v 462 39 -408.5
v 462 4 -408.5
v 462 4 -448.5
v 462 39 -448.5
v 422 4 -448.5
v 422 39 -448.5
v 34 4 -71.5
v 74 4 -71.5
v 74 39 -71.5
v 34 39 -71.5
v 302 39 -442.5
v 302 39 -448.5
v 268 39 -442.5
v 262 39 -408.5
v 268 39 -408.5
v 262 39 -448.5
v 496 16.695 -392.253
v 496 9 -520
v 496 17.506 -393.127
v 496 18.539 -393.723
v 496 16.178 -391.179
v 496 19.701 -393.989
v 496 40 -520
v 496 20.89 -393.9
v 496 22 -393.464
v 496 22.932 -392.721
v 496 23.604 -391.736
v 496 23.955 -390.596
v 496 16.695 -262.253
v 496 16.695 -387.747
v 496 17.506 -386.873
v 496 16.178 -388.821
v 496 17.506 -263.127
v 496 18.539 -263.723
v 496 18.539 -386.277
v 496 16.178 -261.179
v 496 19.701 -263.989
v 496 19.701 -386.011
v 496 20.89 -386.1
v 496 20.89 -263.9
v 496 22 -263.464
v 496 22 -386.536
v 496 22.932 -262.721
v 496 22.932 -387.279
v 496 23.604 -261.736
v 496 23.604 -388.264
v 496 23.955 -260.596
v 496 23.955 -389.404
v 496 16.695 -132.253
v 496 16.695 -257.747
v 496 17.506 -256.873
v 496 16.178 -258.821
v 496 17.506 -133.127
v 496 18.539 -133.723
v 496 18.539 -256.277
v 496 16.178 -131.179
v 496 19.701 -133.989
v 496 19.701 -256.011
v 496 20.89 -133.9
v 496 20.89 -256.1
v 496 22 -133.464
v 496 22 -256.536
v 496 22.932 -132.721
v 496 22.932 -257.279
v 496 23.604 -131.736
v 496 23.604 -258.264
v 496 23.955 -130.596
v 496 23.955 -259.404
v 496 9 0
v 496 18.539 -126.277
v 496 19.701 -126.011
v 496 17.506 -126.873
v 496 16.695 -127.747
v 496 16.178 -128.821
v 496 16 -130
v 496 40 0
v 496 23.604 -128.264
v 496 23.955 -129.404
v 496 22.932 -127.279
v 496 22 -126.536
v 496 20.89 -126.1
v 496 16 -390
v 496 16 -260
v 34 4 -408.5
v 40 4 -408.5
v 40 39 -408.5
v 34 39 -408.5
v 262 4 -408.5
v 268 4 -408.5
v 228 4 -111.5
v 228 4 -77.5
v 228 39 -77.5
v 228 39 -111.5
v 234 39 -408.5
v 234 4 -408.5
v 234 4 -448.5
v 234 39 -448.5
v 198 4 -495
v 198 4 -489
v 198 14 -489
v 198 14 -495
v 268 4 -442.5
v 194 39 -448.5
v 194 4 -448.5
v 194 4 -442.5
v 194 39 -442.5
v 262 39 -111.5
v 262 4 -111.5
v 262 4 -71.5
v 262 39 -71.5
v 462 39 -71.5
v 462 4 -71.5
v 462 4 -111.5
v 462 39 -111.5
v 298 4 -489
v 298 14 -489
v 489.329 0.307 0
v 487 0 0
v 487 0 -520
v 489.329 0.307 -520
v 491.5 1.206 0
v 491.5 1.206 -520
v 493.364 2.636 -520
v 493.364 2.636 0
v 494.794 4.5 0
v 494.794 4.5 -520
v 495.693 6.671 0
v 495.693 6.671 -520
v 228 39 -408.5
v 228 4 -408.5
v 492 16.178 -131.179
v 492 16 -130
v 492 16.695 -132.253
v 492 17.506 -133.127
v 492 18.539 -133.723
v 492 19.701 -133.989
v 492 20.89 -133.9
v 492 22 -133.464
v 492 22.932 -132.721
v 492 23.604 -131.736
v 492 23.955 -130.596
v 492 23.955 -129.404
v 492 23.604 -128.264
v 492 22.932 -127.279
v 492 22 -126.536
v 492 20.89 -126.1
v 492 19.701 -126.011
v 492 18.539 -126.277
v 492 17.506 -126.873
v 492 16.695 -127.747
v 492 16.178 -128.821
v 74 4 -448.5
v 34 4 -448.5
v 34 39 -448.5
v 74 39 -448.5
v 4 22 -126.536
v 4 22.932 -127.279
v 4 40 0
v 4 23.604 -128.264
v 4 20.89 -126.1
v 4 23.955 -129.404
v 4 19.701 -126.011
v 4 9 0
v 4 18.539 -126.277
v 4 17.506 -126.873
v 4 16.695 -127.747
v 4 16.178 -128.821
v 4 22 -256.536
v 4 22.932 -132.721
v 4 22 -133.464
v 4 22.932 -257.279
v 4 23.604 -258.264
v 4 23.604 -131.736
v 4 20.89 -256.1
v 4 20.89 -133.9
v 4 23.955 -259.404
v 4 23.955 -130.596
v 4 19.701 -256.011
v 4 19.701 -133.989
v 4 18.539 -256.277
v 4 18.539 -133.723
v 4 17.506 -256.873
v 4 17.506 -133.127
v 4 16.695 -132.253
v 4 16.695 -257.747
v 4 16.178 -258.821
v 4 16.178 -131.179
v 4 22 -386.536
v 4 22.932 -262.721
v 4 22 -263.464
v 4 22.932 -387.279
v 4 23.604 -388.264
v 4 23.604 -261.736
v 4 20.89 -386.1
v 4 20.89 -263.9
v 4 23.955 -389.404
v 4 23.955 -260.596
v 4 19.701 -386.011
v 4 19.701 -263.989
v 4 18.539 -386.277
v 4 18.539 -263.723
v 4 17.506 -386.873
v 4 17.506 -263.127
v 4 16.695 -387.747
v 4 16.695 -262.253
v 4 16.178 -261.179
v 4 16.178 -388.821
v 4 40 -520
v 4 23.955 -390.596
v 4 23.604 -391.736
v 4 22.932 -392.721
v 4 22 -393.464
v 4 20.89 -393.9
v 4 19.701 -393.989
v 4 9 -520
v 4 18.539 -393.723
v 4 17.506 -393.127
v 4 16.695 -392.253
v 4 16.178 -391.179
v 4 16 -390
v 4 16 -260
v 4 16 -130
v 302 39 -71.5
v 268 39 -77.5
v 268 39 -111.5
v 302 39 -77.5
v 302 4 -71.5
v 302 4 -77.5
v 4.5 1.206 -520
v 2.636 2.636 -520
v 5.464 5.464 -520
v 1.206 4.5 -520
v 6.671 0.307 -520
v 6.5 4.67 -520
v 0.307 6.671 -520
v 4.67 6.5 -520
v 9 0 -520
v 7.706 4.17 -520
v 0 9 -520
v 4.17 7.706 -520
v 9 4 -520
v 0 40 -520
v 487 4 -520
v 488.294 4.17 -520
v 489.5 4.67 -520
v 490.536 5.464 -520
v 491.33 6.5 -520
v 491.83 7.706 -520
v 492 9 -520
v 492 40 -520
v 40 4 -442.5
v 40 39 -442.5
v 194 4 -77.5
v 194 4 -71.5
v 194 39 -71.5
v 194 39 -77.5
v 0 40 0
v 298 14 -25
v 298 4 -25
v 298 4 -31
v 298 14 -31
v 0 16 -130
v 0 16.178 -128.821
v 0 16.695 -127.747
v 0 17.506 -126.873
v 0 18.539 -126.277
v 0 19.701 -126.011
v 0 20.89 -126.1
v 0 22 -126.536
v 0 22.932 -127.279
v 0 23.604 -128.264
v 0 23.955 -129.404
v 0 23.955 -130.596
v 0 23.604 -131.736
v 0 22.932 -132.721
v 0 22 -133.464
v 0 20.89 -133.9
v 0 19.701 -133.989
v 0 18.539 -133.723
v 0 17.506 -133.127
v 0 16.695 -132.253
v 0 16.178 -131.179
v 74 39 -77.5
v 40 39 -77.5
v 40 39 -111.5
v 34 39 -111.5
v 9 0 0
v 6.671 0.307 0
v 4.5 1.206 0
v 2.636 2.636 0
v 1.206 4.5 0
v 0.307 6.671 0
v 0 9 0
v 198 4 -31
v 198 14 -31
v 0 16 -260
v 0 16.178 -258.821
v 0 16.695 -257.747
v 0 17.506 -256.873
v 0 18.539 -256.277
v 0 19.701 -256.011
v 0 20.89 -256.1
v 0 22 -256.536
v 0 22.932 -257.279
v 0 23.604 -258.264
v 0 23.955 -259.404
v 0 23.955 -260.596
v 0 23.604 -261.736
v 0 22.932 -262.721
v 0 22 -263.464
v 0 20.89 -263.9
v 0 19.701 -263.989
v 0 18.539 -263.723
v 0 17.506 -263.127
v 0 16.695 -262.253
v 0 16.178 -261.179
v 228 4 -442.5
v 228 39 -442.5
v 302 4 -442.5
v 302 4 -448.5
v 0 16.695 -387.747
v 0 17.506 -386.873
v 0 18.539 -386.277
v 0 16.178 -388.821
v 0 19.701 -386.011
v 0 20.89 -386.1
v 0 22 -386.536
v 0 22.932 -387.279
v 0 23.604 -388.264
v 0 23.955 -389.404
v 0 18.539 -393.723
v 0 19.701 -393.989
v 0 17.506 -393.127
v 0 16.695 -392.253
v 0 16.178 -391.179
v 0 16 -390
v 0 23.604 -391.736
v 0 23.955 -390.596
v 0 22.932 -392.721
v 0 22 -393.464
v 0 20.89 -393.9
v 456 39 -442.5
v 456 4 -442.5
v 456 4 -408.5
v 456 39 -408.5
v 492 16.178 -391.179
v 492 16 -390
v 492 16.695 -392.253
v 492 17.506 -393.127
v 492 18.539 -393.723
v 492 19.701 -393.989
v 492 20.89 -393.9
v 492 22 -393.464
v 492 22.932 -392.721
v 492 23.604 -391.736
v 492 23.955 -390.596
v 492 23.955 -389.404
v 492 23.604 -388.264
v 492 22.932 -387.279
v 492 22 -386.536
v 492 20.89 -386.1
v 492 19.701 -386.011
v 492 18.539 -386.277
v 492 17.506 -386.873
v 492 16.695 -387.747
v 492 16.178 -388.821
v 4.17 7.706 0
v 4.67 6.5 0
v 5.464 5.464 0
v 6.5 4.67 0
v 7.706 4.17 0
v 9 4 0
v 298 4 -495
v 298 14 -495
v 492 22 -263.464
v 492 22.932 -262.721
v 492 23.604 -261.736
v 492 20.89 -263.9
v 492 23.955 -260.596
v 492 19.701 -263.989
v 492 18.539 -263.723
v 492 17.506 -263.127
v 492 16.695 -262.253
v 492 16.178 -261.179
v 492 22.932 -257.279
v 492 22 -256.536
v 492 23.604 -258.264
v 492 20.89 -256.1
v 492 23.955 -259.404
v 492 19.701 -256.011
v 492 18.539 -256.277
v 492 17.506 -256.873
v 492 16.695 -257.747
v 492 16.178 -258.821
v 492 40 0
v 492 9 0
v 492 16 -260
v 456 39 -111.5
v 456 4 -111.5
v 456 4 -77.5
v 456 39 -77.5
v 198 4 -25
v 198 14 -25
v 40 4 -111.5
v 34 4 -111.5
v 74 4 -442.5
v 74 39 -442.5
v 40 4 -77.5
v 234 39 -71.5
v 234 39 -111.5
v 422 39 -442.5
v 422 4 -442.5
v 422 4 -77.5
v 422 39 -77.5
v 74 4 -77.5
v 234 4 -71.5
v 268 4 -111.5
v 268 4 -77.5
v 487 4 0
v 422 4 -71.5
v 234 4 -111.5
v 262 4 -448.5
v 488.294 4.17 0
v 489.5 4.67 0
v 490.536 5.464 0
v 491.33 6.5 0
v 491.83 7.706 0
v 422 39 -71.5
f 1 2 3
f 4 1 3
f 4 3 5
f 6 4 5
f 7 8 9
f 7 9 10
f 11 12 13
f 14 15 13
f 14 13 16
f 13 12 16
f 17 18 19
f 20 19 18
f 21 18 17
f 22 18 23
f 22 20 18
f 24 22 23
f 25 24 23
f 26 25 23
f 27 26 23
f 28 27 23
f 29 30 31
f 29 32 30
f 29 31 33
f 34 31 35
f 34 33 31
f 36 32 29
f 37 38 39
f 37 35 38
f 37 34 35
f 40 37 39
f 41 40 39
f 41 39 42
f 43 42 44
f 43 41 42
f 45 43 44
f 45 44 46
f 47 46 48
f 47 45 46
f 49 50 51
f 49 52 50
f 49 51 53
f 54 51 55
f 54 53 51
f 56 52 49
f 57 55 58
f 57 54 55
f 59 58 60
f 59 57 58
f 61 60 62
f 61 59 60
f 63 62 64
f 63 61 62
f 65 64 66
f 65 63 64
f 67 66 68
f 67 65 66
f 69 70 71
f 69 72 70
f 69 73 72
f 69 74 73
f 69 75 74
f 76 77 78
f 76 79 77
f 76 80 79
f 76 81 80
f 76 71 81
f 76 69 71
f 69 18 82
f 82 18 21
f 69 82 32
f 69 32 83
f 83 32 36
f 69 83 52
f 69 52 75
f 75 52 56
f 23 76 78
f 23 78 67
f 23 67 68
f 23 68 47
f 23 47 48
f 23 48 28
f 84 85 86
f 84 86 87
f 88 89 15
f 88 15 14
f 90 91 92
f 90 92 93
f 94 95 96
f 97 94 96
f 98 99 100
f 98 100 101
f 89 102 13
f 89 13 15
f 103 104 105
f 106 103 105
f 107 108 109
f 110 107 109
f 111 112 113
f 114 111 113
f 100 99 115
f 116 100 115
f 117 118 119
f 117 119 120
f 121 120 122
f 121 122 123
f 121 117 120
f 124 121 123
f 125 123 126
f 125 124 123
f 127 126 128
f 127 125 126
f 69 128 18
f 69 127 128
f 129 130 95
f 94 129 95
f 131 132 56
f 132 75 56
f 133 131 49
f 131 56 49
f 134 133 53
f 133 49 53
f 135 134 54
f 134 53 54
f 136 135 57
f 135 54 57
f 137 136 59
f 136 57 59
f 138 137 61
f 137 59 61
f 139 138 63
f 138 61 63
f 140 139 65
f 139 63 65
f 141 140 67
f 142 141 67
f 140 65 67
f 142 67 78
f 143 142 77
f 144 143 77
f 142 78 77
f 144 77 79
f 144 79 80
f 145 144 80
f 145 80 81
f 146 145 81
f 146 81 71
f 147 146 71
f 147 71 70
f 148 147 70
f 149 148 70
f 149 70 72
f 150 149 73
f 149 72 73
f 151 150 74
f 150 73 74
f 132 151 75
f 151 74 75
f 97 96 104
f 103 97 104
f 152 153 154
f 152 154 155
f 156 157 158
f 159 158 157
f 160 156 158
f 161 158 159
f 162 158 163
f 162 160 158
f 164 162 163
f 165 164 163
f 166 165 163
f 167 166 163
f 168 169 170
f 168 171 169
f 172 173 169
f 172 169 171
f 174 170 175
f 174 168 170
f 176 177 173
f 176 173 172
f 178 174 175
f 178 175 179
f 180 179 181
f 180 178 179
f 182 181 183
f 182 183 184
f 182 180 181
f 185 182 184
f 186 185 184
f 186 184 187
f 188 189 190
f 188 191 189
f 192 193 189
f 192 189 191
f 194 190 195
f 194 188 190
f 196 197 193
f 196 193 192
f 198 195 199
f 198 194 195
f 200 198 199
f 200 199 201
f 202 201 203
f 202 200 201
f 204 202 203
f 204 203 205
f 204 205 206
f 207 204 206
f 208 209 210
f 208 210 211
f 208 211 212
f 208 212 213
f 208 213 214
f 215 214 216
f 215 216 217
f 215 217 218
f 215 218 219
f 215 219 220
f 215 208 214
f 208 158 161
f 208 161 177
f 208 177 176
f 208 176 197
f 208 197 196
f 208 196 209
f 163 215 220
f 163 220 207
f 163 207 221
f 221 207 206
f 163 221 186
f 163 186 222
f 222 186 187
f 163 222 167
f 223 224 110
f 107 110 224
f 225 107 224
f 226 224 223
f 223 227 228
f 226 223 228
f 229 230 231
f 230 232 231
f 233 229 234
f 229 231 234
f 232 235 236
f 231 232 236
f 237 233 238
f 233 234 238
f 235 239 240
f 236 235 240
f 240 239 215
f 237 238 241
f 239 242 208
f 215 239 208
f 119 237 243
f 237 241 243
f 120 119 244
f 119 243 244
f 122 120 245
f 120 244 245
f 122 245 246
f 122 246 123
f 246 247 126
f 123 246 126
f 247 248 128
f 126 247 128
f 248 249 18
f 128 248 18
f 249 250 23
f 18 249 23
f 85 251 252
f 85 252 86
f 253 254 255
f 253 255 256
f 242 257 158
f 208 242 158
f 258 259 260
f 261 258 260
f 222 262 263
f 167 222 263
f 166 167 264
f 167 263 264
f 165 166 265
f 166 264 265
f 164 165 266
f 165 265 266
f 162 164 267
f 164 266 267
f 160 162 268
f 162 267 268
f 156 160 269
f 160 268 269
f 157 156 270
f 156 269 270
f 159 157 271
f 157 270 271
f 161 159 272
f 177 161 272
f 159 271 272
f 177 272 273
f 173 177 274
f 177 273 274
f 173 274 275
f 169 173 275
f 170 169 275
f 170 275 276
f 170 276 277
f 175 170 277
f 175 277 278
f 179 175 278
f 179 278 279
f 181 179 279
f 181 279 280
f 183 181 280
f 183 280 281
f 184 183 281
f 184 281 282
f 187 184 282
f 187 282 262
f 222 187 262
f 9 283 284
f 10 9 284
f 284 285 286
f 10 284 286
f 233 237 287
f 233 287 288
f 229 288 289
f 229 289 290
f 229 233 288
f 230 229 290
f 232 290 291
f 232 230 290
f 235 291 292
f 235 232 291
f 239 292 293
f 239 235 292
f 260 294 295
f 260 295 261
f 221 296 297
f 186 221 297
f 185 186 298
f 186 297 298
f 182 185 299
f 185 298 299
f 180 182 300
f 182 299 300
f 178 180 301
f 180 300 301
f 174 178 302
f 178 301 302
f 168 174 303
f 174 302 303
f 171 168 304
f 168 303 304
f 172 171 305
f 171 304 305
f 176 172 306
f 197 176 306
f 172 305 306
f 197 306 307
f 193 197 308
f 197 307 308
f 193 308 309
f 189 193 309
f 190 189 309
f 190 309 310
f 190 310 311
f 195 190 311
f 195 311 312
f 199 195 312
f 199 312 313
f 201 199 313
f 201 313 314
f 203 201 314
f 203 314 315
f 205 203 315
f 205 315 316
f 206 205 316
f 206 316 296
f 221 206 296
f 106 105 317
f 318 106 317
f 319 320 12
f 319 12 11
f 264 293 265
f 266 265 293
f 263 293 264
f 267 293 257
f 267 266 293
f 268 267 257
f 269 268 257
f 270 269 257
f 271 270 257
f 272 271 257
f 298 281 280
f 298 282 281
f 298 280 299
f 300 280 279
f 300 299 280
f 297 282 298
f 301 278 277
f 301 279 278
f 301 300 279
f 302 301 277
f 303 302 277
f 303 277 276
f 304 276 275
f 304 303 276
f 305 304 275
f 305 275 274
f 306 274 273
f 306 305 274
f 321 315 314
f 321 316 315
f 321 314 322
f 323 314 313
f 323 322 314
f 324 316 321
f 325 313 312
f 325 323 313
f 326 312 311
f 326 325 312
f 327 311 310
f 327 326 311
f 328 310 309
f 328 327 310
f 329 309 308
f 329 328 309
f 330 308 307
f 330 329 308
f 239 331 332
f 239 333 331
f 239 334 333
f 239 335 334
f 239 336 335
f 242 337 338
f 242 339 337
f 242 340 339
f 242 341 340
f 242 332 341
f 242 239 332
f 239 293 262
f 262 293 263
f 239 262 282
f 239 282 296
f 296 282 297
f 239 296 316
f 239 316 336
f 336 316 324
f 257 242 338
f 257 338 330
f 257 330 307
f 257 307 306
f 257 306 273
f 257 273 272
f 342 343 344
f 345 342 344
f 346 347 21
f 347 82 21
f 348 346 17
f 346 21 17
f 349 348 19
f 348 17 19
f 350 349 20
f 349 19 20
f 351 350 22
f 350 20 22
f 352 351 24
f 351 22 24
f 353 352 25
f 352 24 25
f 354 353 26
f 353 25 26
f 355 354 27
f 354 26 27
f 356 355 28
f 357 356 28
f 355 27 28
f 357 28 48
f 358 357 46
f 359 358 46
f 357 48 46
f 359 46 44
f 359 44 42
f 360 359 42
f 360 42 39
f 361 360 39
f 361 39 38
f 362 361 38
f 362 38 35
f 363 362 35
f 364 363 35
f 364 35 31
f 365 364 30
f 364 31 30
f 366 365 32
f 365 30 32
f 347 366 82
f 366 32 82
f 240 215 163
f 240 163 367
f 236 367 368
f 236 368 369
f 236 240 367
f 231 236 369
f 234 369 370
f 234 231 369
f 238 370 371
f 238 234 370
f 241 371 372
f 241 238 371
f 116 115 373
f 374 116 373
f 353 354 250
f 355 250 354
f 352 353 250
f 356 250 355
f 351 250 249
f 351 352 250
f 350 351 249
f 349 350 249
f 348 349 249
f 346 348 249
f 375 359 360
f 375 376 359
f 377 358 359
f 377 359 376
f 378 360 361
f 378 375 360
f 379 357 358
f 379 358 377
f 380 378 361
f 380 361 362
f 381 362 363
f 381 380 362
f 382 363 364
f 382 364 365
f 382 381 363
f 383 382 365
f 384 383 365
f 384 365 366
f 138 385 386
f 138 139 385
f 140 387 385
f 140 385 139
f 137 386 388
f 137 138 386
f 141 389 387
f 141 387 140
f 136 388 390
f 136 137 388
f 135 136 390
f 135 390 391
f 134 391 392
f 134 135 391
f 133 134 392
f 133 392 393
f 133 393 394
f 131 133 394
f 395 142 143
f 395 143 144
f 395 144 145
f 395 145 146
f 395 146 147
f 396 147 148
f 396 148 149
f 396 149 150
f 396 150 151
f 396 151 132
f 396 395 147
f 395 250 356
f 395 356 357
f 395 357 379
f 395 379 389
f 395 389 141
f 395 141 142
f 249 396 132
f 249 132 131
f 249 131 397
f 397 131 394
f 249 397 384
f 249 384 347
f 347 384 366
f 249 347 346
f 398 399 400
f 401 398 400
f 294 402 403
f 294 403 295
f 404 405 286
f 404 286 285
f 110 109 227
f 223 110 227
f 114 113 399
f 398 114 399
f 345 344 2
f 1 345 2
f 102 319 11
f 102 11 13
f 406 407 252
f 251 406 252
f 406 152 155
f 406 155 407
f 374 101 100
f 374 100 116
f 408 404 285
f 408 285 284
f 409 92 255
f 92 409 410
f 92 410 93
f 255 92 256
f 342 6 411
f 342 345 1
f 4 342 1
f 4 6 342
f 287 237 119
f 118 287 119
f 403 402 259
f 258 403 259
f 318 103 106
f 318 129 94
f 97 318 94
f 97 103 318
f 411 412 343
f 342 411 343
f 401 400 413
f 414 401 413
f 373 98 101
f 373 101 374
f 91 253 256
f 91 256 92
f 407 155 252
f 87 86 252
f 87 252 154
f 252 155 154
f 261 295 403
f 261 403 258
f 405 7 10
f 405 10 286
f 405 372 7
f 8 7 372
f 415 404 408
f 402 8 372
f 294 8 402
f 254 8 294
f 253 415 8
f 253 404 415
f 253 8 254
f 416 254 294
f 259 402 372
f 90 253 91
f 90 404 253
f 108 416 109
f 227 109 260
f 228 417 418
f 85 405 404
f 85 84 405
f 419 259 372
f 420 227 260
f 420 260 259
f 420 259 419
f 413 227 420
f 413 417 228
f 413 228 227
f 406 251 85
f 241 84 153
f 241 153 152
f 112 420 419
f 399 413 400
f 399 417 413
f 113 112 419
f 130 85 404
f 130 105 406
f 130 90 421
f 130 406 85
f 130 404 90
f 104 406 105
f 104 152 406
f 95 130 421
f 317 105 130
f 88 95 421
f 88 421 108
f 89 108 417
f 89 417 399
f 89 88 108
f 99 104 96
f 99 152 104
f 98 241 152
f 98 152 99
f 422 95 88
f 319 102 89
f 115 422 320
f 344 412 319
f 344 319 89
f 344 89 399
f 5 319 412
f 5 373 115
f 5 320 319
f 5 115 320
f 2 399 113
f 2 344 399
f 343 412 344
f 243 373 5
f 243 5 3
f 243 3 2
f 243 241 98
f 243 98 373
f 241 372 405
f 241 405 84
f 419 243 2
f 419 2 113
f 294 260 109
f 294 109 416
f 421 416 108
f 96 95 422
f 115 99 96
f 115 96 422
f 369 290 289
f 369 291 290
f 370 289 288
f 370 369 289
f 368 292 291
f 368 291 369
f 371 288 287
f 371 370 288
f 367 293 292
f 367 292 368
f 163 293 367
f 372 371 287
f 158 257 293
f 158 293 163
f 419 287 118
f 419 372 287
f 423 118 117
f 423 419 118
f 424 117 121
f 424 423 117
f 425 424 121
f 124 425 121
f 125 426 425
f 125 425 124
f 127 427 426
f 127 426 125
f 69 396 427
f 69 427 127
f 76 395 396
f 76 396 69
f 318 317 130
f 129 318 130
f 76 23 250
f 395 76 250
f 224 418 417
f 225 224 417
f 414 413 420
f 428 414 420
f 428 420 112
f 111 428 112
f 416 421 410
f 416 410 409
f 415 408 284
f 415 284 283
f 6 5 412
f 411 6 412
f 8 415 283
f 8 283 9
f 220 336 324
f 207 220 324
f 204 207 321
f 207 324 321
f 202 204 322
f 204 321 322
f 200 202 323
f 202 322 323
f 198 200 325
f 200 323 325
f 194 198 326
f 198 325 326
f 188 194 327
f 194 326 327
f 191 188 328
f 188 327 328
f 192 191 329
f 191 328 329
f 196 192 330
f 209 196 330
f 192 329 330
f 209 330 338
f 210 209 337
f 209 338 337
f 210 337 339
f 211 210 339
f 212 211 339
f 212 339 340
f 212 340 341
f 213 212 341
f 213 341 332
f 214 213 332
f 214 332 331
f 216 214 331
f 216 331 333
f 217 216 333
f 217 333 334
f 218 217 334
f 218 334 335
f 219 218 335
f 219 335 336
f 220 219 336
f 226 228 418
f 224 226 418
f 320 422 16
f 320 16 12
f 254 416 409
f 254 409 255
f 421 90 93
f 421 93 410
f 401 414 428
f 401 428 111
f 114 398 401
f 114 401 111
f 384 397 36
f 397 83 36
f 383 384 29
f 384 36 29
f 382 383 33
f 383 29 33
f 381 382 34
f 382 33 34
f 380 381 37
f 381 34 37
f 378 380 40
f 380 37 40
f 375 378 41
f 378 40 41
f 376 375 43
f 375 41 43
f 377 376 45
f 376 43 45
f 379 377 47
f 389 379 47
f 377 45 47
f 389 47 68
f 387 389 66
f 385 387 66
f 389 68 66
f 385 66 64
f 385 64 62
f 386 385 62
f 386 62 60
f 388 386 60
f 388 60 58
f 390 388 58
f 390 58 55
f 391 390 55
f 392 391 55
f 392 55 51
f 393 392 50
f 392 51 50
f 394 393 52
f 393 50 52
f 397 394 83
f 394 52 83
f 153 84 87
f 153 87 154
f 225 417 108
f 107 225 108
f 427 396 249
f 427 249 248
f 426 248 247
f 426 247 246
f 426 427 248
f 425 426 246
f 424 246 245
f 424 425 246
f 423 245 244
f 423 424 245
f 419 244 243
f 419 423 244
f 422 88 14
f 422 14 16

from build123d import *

# Parameters (mm, degrees)
SKETCH1_W                    = 496
SKETCH1_H                    = 520
BOSS_EXTRUDE1_DEPTH          = 4
EDGE_FLANGE1_STRIP_W         = 26
EDGE_FLANGE1_STRIP_H         = 4
EDGE_FLANGE1_STRIP_CUT_DEPTH = 520
EDGE_FLANGE1_DEPTH           = 520
EDGE_FLANGE2_STRIP_W         = 26
EDGE_FLANGE2_STRIP_H         = 4
EDGE_FLANGE2_STRIP_CUT_DEPTH = 520
EDGE_FLANGE2_DEPTH           = 520
CUT_EXTRUDE1_REACH           = 721.733
SKETCH17_R                   = 4
CUT_EXTRUDE2_REACH           = 721.733
SKETCH19_R                   = 4
BOSS_EXTRUDE2_DEPTH          = 35
SKETCH21_W                   = 100
SKETCH21_H                   = 6
BOSS_EXTRUDE3_DEPTH          = 10


# Sheet-metal steps are written as plain solids
with BuildPart() as part:
    # Sketch1 → Boss-Extrude1 (new body)
    with BuildSketch(Plane(origin=(0, 0, 0), x_dir=(1, 0, 0), z_dir=(0, 1, 0))):
        with Locations((248, 260)):
            Rectangle(SKETCH1_W, SKETCH1_H)
    extrude(amount=BOSS_EXTRUDE1_DEPTH)

    # Edge-Flange1 strip (across the edge) → Edge-Flange1 strip cut (cut)
    with BuildSketch(Plane(origin=(0, 4, -520), x_dir=(1, 0, 0), z_dir=(0, 0, 1))):
        with Locations((-4, -2)):
            Rectangle(EDGE_FLANGE1_STRIP_W, EDGE_FLANGE1_STRIP_H)
    extrude(amount=EDGE_FLANGE1_STRIP_CUT_DEPTH, mode=Mode.SUBTRACT)

    # Edge-Flange1 section (across the edge) → Edge-Flange1 (add)
    with BuildSketch(Plane(origin=(0, 4, -520), x_dir=(1, 0, 0), z_dir=(0, 0, 1))):
        with BuildLine():
            Line((0, 5), (0, 36))
            Line((0, 36), (4, 36))
            Line((4, 36), (4, 5))
            ThreePointArc((4, 5), (5.464466094, 1.464466094), (9, 0))
            Line((9, 0), (9, -4))
            ThreePointArc((9, -4), (2.636038969, -1.363961031), (0, 5))
        make_face()
    extrude(amount=EDGE_FLANGE1_DEPTH)

    # Edge-Flange2 strip (across the edge) → Edge-Flange2 strip cut (cut)
    with BuildSketch(Plane(origin=(496, 4, 0), x_dir=(-1, 0, 0), z_dir=(0, 0, -1))):
        with Locations((-4, -2)):
            Rectangle(EDGE_FLANGE2_STRIP_W, EDGE_FLANGE2_STRIP_H)
    extrude(amount=EDGE_FLANGE2_STRIP_CUT_DEPTH, mode=Mode.SUBTRACT)

    # Edge-Flange2 section (across the edge) → Edge-Flange2 (add)
    with BuildSketch(Plane(origin=(496, 4, 0), x_dir=(-1, 0, 0), z_dir=(0, 0, -1))):
        with BuildLine():
            Line((0, 5), (0, 36))
            Line((0, 36), (4, 36))
            Line((4, 36), (4, 5))
            ThreePointArc((4, 5), (5.464466094, 1.464466094), (9, 0))
            Line((9, 0), (9, -4))
            ThreePointArc((9, -4), (2.636038969, -1.363961031), (0, 5))
        make_face()
    extrude(amount=EDGE_FLANGE2_DEPTH)

    # Sketch17 → Cut-Extrude1 (cut, up to next)
    with BuildSketch(Plane.ZY, mode=Mode.PRIVATE) as cut_extrude1_sk1:
        with Locations(Location((-390, 20, 0), (0, 0, 270))):
            Circle(SKETCH17_R)
    cut_extrude1_tool1 = extrude(cut_extrude1_sk1.sketch, amount=-CUT_EXTRUDE1_REACH, mode=Mode.PRIVATE) & part.part
    # Sketch17 → Cut-Extrude1 (cut, up to next)
    with BuildSketch(Plane.ZY, mode=Mode.PRIVATE) as cut_extrude1_sk2:
        with Locations(Location((-260, 20, 0), (0, 0, 270))):
            Circle(SKETCH17_R)
    cut_extrude1_tool2 = extrude(cut_extrude1_sk2.sketch, amount=-CUT_EXTRUDE1_REACH, mode=Mode.PRIVATE) & part.part
    # Sketch17 → Cut-Extrude1 (cut, up to next)
    with BuildSketch(Plane.ZY, mode=Mode.PRIVATE) as cut_extrude1_sk3:
        with Locations(Location((-130, 20, 0), (0, 0, 270))):
            Circle(SKETCH17_R)
    cut_extrude1_tool3 = extrude(cut_extrude1_sk3.sketch, amount=-CUT_EXTRUDE1_REACH, mode=Mode.PRIVATE) & part.part
    add(cut_extrude1_tool1.solids().sort_by_distance((0, 20, -390))[0], mode=Mode.SUBTRACT)
    add(cut_extrude1_tool2.solids().sort_by_distance((0, 20, -260))[0], mode=Mode.SUBTRACT)
    add(cut_extrude1_tool3.solids().sort_by_distance((0, 20, -130))[0], mode=Mode.SUBTRACT)

    # Sketch19 → Cut-Extrude2 (cut, up to next)
    with BuildSketch(Plane(origin=(496, 0, 0), x_dir=(0, 0, -1), z_dir=(1, 0, 0)), mode=Mode.PRIVATE) as cut_extrude2_sk1:
        with Locations(Location((130, 20, 0), (0, 0, 270))):
            Circle(SKETCH19_R)
    cut_extrude2_tool1 = extrude(cut_extrude2_sk1.sketch, amount=-CUT_EXTRUDE2_REACH, mode=Mode.PRIVATE) & part.part
    # Sketch19 → Cut-Extrude2 (cut, up to next)
    with BuildSketch(Plane(origin=(496, 0, 0), x_dir=(0, 0, -1), z_dir=(1, 0, 0)), mode=Mode.PRIVATE) as cut_extrude2_sk2:
        with Locations(Location((260, 20, 0), (0, 0, 270))):
            Circle(SKETCH19_R)
    cut_extrude2_tool2 = extrude(cut_extrude2_sk2.sketch, amount=-CUT_EXTRUDE2_REACH, mode=Mode.PRIVATE) & part.part
    # Sketch19 → Cut-Extrude2 (cut, up to next)
    with BuildSketch(Plane(origin=(496, 0, 0), x_dir=(0, 0, -1), z_dir=(1, 0, 0)), mode=Mode.PRIVATE) as cut_extrude2_sk3:
        with Locations(Location((390, 20, 0), (0, 0, 270))):
            Circle(SKETCH19_R)
    cut_extrude2_tool3 = extrude(cut_extrude2_sk3.sketch, amount=-CUT_EXTRUDE2_REACH, mode=Mode.PRIVATE) & part.part
    add(cut_extrude2_tool1.solids().sort_by_distance((496, 20, -130))[0], mode=Mode.SUBTRACT)
    add(cut_extrude2_tool2.solids().sort_by_distance((496, 20, -260))[0], mode=Mode.SUBTRACT)
    add(cut_extrude2_tool3.solids().sort_by_distance((496, 20, -390))[0], mode=Mode.SUBTRACT)

    # Sketch20 → Boss-Extrude2 (add)
    with BuildSketch(Plane(origin=(0, 4, 0), x_dir=(1, 0, 0), z_dir=(0, 1, 0))):
        Polygon((34, 448.5), (74, 448.5), (74, 442.5), (40, 442.5), (40, 408.5), (34, 408.5), align=None)
        Polygon((234, 448.5), (194, 448.5), (194, 442.5), (228, 442.5), (228, 408.5), (234, 408.5), align=None)
        Polygon((234, 71.5), (194, 71.5), (194, 77.5), (228, 77.5), (228, 111.5), (234, 111.5), align=None)
        Polygon((34, 71.5), (34, 111.5), (40, 111.5), (40, 77.5), (74, 77.5), (74, 71.5), align=None)
        Polygon((262, 448.5), (302, 448.5), (302, 442.5), (268, 442.5), (268, 408.5), (262, 408.5), align=None)
        Polygon((462, 448.5), (422, 448.5), (422, 442.5), (456, 442.5), (456, 408.5), (462, 408.5), align=None)
        Polygon((262, 71.5), (302, 71.5), (302, 77.5), (268, 77.5), (268, 111.5), (262, 111.5), align=None)
        Polygon((462, 71.5), (462, 111.5), (456, 111.5), (456, 77.5), (422, 77.5), (422, 71.5), align=None)
    extrude(amount=BOSS_EXTRUDE2_DEPTH)

    # Sketch21 → Boss-Extrude3 (add)
    with BuildSketch(Plane(origin=(0, 4, 0), x_dir=(1, 0, 0), z_dir=(0, 1, 0))):
        with Locations((248, 28)):
            Rectangle(SKETCH21_W, SKETCH21_H)
        with Locations((248, 492)):
            Rectangle(SKETCH21_W, SKETCH21_H)
    extrude(amount=BOSS_EXTRUDE3_DEPTH)


solid = part.part
